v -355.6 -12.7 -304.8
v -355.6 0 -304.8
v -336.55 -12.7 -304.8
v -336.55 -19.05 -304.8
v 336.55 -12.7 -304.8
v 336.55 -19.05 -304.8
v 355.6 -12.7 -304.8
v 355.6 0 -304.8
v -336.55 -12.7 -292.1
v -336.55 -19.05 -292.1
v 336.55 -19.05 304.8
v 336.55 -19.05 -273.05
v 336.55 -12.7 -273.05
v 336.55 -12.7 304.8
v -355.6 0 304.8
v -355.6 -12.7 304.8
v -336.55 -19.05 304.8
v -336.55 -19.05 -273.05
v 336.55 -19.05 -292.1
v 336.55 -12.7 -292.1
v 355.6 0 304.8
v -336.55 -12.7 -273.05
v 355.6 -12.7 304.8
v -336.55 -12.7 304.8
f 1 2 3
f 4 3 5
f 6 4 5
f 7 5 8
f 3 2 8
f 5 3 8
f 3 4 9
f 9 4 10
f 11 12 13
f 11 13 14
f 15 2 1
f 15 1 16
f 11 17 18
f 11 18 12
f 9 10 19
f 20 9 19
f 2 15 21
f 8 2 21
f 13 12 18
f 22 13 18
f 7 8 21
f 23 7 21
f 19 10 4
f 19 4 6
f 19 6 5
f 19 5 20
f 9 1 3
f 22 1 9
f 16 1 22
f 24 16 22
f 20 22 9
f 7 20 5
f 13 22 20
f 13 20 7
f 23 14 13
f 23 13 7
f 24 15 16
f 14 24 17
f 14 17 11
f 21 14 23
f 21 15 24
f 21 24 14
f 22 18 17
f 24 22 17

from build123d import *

# Parameters (mm, degrees)
F0_W     = 711.2
F0_H     = 609.6
F1_DEPTH = 19.05
F2_W     = 19.05
F2_H     = 577.85
F2_H_2   = 19.05
F2_H_3   = 12.7
F2_W_2   = 673.1
F3_DEPTH = 6.35


with BuildPart() as f1:
    # F0 (on Front) → F1 (new body)
    with BuildSketch(Plane.XZ):
        Rectangle(F0_W, F0_H)
    extrude(amount=F1_DEPTH)

    # F2 (on face) → F3 (cut)
    with BuildSketch(Plane.XZ.offset(19.05)):
        with Locations((-346.075, 15.875)):
            Rectangle(F2_W, F2_H)
        with Locations((-346.075, -282.575)):
            Rectangle(F2_W, F2_H_2)
        with Locations((-346.075, -298.45)):
            Rectangle(F2_W, F2_H_3)
        with Locations((0, -282.575)):
            Rectangle(F2_W_2, F2_H_2)
        with Locations((346.075, -282.575)):
            Rectangle(F2_W, F2_H_2)
        with Locations((346.075, 15.875)):
            Rectangle(F2_W, F2_H)
        with Locations((346.075, -298.45)):
            Rectangle(F2_W, F2_H_3)
    extrude(amount=-F3_DEPTH, mode=Mode.SUBTRACT)


solid = f1.part
